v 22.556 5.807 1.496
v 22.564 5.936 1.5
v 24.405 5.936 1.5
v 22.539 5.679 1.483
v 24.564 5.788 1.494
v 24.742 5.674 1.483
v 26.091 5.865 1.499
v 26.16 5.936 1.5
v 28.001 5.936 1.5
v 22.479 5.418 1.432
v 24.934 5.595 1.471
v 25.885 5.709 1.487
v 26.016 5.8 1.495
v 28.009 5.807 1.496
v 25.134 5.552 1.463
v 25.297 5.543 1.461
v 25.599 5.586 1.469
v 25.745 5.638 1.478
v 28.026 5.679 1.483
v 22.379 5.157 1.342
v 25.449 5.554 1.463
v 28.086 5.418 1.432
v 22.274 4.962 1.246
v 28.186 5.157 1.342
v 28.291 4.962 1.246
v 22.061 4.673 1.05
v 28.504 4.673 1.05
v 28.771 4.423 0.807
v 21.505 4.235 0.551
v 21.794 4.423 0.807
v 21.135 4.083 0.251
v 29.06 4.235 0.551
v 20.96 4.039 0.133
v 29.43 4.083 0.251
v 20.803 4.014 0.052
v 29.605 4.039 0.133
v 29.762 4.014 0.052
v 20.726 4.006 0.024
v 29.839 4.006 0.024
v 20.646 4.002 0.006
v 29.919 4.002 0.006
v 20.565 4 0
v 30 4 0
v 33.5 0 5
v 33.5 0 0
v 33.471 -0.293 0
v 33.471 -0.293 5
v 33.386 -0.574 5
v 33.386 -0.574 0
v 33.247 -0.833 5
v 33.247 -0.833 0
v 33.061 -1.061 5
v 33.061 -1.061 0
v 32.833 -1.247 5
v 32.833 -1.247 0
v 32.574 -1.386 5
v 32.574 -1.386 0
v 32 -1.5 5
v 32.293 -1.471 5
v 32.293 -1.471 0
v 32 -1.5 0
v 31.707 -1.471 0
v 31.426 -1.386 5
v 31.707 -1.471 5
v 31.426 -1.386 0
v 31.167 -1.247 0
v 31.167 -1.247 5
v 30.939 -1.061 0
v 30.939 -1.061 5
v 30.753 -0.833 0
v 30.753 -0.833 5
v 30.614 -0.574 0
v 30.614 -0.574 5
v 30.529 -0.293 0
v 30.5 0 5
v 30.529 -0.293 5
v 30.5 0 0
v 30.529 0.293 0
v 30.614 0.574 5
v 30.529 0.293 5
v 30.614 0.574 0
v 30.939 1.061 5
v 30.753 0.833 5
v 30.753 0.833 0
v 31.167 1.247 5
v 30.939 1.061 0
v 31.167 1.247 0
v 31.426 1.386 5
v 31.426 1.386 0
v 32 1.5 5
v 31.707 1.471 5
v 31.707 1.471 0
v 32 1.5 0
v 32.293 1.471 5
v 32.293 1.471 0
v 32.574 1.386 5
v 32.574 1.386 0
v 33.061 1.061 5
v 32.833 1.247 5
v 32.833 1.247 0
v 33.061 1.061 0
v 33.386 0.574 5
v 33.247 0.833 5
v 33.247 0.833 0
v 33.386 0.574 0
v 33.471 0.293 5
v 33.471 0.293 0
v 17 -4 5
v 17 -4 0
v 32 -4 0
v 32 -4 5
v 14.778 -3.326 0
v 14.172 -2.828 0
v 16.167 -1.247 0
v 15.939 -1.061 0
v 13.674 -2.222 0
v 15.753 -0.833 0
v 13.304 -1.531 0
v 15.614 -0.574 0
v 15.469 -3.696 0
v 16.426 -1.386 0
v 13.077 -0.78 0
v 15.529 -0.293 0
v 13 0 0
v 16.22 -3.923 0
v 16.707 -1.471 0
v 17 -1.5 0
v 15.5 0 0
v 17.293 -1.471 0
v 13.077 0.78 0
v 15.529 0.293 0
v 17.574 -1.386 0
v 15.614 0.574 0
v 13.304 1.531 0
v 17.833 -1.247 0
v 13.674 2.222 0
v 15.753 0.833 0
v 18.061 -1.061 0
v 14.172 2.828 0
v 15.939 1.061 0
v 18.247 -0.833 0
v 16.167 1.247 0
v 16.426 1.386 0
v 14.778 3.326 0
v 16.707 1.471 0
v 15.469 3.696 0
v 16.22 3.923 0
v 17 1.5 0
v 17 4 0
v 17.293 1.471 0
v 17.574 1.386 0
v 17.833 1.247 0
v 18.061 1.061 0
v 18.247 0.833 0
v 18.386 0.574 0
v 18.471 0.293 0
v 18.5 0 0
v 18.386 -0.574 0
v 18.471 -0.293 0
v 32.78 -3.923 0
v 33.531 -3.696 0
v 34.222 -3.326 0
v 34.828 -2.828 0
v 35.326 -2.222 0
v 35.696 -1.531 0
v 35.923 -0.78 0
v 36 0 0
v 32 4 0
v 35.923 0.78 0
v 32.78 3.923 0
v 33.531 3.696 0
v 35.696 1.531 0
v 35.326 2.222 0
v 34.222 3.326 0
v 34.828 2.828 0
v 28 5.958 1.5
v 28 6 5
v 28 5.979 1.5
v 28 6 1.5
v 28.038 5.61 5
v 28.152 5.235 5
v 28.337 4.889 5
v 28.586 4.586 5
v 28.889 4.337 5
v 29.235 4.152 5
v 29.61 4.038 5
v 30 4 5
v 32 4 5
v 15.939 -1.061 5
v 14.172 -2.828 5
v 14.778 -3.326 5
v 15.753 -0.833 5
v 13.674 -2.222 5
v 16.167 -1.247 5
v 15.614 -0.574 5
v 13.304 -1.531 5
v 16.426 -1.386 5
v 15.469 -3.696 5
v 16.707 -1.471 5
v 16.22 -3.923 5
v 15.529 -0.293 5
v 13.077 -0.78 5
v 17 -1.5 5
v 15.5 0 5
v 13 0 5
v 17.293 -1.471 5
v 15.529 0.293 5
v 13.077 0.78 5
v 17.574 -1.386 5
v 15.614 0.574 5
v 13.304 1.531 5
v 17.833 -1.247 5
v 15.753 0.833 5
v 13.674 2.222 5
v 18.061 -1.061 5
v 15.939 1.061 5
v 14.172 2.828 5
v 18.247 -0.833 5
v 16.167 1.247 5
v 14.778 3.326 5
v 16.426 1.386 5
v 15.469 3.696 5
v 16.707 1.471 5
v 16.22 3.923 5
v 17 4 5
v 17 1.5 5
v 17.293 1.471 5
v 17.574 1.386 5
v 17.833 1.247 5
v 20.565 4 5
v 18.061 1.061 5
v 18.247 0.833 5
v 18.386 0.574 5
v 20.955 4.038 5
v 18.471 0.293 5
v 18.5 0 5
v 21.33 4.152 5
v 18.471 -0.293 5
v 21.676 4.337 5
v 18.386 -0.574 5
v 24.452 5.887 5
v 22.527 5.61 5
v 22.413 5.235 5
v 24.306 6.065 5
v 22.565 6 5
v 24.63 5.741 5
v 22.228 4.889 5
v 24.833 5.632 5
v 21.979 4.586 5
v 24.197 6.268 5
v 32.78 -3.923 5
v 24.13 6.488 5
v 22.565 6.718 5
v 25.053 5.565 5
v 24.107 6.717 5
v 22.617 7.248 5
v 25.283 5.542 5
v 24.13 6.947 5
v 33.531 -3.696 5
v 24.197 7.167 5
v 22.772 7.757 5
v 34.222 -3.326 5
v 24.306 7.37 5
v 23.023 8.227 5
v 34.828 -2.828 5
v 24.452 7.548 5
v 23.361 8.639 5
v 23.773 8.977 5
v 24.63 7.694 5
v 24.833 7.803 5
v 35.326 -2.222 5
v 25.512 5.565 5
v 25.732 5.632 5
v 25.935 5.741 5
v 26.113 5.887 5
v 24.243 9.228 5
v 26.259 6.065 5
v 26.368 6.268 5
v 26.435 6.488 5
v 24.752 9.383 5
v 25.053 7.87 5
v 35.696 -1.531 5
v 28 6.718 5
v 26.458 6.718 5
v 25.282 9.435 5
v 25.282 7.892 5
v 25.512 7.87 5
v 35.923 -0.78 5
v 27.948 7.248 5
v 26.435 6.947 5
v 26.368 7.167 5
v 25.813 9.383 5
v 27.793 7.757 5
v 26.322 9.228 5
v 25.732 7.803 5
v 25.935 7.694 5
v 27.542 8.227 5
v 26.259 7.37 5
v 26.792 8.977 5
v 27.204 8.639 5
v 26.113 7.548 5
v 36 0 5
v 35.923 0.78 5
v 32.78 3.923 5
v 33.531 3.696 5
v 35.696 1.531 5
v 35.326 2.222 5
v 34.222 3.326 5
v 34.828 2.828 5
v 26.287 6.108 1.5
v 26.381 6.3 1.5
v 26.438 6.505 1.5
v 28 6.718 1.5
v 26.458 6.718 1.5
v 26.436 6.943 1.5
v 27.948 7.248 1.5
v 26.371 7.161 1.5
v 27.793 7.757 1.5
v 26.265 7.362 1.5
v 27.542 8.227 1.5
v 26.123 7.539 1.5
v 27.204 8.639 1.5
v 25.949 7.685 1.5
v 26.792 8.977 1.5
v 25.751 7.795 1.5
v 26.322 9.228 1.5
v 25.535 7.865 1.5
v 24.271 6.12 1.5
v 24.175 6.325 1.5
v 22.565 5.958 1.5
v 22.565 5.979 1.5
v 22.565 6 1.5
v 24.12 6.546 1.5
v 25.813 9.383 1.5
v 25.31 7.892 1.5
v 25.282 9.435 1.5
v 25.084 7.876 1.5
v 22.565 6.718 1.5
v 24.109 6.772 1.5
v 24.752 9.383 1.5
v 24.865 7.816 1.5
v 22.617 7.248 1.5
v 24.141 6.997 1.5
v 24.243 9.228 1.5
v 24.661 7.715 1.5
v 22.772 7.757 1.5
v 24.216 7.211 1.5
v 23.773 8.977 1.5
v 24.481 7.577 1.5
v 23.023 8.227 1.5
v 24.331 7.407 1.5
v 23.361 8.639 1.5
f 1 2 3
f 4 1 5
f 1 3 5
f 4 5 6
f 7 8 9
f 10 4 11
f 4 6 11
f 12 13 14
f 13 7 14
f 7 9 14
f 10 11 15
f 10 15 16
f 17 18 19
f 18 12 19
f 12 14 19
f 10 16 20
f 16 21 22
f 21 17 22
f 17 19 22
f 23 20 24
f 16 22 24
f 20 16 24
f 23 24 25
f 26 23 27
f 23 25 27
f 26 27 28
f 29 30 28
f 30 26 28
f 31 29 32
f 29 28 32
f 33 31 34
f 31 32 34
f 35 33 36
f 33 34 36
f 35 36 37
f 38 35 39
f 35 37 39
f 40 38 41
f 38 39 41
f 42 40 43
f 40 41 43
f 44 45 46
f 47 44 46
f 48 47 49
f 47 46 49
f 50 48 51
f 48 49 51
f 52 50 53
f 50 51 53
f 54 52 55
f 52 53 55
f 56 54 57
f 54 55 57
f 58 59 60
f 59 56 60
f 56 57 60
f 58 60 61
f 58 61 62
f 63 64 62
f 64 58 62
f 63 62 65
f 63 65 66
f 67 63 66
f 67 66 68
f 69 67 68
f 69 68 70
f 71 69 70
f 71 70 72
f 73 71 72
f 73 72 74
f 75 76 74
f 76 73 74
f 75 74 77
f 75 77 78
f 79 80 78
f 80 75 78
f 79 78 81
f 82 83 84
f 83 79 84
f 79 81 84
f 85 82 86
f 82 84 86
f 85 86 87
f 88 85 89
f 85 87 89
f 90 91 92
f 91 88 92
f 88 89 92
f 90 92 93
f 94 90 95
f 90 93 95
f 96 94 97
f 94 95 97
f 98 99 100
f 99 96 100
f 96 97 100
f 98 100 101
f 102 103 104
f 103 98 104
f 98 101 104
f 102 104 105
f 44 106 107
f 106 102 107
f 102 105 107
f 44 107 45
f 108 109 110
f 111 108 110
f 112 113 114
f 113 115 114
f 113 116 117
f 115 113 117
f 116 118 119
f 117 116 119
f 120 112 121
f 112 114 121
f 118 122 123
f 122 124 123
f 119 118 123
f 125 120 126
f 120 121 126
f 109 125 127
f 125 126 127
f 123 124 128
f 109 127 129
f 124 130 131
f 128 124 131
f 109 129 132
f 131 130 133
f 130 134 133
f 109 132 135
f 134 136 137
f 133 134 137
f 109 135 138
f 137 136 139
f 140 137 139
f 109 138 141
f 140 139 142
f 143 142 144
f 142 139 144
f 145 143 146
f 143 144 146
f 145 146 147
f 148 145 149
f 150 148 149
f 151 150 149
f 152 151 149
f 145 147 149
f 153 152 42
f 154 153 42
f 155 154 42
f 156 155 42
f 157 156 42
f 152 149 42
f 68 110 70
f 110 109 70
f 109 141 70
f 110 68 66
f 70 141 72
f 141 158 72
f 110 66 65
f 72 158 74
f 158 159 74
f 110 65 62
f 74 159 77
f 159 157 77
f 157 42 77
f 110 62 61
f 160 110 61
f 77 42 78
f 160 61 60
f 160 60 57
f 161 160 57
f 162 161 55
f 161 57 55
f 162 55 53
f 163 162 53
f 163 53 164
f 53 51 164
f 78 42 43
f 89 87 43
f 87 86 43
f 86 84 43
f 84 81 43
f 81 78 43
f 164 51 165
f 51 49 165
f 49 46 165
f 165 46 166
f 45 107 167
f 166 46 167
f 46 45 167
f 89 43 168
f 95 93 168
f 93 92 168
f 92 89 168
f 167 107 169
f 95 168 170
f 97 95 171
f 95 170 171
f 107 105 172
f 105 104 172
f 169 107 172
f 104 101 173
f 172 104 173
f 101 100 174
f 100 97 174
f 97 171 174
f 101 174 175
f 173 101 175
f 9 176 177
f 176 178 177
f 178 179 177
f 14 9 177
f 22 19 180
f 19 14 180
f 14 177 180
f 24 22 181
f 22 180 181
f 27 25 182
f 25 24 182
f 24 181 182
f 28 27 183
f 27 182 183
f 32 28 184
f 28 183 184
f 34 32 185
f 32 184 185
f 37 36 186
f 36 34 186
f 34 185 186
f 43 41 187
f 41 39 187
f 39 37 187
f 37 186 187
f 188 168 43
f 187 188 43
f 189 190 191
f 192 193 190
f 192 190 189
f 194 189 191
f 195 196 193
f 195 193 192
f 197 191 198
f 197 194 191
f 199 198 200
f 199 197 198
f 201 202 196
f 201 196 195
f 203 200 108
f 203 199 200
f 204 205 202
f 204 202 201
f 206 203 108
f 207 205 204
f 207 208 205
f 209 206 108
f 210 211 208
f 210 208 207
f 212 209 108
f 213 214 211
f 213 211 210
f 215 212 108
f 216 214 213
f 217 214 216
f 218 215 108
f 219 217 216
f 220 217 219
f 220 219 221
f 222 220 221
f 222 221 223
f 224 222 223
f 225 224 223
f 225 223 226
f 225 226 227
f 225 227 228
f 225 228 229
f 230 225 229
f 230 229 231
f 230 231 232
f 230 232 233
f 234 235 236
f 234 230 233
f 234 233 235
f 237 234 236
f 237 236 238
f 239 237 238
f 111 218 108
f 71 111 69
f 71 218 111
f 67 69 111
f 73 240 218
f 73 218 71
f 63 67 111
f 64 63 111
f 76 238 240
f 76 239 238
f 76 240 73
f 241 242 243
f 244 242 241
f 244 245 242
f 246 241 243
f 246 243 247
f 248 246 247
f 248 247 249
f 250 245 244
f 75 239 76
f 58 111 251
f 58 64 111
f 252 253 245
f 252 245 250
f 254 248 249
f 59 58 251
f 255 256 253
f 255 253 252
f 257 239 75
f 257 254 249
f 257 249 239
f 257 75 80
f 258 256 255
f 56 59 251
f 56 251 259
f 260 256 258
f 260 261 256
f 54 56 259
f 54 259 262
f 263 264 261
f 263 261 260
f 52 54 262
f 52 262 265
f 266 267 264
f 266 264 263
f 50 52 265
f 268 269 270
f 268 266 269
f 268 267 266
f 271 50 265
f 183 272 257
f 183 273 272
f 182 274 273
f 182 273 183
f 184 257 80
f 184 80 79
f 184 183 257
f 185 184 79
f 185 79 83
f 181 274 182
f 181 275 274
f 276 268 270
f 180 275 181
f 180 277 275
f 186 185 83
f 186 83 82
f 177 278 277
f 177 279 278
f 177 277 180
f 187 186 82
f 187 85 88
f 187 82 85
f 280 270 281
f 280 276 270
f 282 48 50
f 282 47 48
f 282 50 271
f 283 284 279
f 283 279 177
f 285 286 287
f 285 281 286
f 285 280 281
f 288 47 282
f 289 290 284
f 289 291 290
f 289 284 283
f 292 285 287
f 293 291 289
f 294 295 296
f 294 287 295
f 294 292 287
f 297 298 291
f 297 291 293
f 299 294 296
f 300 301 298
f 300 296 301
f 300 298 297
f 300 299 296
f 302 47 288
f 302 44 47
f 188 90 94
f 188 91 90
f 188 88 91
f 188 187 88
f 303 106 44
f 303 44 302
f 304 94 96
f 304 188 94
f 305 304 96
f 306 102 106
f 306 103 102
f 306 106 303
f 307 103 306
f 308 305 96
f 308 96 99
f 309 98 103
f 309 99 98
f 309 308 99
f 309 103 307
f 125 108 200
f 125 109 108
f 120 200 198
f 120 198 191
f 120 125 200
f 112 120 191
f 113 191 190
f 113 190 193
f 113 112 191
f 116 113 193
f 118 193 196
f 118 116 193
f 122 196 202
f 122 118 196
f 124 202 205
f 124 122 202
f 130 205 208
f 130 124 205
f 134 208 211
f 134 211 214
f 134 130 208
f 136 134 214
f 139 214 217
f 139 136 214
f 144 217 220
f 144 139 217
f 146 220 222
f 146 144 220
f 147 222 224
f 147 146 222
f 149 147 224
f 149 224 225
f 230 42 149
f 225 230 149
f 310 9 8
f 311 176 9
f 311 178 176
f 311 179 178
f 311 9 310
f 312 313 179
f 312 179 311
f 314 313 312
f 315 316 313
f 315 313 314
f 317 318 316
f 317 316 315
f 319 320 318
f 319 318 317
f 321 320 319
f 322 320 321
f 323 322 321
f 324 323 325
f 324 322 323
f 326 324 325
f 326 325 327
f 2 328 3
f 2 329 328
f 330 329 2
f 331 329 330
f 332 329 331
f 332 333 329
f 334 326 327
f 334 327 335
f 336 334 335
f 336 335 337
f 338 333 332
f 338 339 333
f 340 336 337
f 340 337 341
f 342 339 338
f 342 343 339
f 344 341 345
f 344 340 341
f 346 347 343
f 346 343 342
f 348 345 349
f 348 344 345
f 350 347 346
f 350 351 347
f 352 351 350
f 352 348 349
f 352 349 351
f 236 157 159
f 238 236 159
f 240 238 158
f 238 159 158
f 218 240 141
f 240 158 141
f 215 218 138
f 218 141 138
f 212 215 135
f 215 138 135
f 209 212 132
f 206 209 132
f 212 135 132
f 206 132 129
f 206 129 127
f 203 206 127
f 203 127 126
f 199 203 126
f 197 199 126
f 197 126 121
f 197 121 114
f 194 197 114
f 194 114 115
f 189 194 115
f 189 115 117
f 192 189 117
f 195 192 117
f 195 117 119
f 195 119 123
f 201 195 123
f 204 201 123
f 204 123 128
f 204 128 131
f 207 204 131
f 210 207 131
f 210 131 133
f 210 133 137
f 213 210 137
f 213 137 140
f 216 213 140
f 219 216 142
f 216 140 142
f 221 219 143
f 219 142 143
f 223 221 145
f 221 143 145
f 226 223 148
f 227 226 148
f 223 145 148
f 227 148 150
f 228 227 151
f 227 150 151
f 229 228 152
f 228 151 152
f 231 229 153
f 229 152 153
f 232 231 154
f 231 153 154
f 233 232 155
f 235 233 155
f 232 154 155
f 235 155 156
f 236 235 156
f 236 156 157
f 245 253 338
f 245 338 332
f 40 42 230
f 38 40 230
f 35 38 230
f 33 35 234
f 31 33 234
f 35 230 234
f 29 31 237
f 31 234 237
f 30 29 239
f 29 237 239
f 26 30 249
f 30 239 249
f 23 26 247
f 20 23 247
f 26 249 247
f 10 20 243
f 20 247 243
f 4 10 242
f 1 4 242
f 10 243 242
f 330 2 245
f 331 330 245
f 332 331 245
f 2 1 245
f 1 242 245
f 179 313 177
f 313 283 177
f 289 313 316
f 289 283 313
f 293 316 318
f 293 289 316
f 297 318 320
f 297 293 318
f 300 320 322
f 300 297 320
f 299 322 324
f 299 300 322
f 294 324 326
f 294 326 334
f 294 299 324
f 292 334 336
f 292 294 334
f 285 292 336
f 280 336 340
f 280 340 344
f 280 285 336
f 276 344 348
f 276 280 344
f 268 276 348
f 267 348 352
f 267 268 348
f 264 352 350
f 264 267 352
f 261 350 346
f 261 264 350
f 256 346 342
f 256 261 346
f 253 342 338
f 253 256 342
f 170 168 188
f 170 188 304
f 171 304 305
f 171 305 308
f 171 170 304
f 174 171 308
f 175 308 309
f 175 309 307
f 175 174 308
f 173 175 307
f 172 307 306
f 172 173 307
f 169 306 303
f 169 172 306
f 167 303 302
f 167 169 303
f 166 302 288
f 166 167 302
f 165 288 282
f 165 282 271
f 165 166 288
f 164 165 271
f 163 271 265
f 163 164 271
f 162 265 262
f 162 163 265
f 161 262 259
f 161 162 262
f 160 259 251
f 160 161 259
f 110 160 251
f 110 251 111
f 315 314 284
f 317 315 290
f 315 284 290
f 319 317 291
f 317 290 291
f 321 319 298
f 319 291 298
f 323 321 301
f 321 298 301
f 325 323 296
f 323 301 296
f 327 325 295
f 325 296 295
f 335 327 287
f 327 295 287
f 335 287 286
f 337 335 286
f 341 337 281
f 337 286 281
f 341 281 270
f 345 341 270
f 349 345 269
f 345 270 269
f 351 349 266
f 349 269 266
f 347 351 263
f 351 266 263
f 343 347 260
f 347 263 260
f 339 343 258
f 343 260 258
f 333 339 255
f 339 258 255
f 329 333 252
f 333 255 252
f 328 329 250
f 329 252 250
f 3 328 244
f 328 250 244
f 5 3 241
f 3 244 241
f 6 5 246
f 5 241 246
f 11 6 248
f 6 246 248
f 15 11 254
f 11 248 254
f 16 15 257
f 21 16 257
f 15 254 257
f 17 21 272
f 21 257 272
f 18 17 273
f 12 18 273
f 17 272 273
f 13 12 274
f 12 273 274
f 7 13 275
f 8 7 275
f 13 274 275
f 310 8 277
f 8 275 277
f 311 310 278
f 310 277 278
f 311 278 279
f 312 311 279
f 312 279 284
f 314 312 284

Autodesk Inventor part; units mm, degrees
ref_plane "YZ Plane" through (0, 0, 0) normal (1, 0, 0) x (0, 1, 0)
ref_plane "XZ Plane" through (0, 0, 0) normal (0, 1, 0) x (-1, 0, 0)
ref_plane "XY Plane" through (0, 0, 0) normal (0, 0, 1) x (1, 0, 0)
sketch "Sketch1" plane through (0, 0, 0) normal (0, 0, 1) x (1, 0, 0)
  line L0 (40, 21) -> (41, 20) projected
  line L1 (40, 21) -> (32, 21) projected
  line L2 (32, 21) -> (32, 16) projected
  line L3 (32, 16) -> (35, 16) projected
  arc A0 (36, 15) -> (35, 16) centre (35, 15) ccw projected
  line L4 (36, 15) -> (36, 8) projected
  arc A1 (32, 4) -> (36, 8) centre (32, 8) ccw projected
  line L5 (32, 4) -> (15, 4) projected
  arc A2 (11.4706, 6.1176) -> (15, 4) centre (15, 8) ccw projected
  arc A3 (11.4706, 6.1176) -> (11.4706, -6.1176) centre (0, 0) ccw projected
  arc A4 (15, -4) -> (11.4706, -6.1176) centre (15, -8) ccw projected
  line L6 (15, -4) -> (32, -4) projected
  arc A5 (36, -8) -> (32, -4) centre (32, -8) ccw projected
  line L7 (36, -8) -> (36, -20.0526) projected
  line L8 (36, -20.0526) -> (39.035, -20.6277) projected
  line L9 (41, -19) -> (39.035, -20.6277) projected
  line L10 (41, -19) -> (41, 20) projected
  circle A6 centre (17, 0) radius 1.5 projected
  circle A7 centre (32, 0) radius 1.5 projected
  circle A8 centre (0, 0) radius 8.65 projected
  line L11 (32, 0) -> (17, 0)
  line L12 (32, 0) -> (17, 0) construction
  line L13 (32, 4) -> (17, 4)
  line L14 (17, -4) -> (32, -4)
  arc A9 (32, -4) -> (32, 4) centre (32, 0) ccw
  arc A10 (17, 4) -> (17, -4) centre (17, 0) ccw
  point P0 (0, 0)
  point P1 (24.5, 0)
  dimension "d0" = 7.5
  dimension "d1" = 8
extrude "Extrusion1" add sketch "Sketch1" along normal blind 3.5 contours L6 A10 L5 A9
thicken "Thicken1" operation add thickness 1.5 both sides no extend neighbours yes toward (0, 0, 1) faces at (22.4427, 2.899, 3.5)
sketch "Sketch2" plane through (17, 4, 5) normal (0, 0, 1) x (1, 0, 0)
  circle A0 centre (8.2825, 2.7175) radius 1.175 projected
  circle A1 centre (8.2825, 2.7175) radius 2.7175
  line L0 (15, 0) -> (0, 0) projected
  line L1 (11, 2.7175) -> (8.2825, 2.7175)
  line L2 (8.2825, 2.7175) -> (5.565, 2.7175)
  line L3 (5.565, 2.7175) -> (5.565, 0)
  line L4 (11, 2.7175) -> (11, 0)
  point P0 (-17, -4)
extrude "Extrusion2" add sketch "Sketch2" against normal blind 3.5 contours L1 A1 L2 A0 | A0 L2 A1 L1 | L4 L0 A1 | A1 L0 L3
fillet "Fillet1" radius 2 3 edges at (25.2825, 4, 1.5) (22.565, 4, 3.25) (28, 4, 3.25)
properties part number "switch_holder"
